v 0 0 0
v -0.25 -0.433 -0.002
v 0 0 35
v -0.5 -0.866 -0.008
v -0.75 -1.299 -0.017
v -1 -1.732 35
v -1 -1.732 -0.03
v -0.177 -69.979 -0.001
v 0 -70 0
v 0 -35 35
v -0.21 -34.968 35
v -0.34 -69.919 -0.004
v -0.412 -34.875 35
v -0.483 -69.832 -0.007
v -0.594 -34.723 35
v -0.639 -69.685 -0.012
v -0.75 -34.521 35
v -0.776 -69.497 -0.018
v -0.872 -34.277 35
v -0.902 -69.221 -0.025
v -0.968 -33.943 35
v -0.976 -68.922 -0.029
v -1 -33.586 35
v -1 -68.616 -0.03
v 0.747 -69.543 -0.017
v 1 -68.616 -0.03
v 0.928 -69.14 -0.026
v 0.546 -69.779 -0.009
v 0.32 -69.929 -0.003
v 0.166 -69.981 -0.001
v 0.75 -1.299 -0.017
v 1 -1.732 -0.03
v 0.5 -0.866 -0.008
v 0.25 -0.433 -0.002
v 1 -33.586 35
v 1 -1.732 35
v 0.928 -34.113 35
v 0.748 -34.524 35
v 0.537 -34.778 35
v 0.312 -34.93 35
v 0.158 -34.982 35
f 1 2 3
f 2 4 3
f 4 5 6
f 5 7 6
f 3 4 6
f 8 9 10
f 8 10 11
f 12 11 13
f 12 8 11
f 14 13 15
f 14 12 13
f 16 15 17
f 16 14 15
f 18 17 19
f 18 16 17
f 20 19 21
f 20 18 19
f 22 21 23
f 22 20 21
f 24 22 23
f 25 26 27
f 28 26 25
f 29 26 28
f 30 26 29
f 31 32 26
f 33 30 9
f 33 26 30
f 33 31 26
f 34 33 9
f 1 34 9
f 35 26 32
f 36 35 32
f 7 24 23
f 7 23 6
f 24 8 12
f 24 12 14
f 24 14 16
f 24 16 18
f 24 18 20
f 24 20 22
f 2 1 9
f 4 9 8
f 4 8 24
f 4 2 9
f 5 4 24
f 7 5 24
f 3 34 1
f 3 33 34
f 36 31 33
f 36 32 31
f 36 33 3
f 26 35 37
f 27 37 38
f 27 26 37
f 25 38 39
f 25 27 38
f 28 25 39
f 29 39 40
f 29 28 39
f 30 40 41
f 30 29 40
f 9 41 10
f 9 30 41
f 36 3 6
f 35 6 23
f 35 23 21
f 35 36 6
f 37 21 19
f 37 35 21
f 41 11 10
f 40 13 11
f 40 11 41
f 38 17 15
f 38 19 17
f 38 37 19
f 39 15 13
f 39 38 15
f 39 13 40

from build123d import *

# Parameters (mm, degrees)
F0_W     = 70
F0_H     = 5
F1_DEPTH = 1
F2_R     = 1
F3_R     = 0.99999
F5_DEPTH = 75
F6_SIZE2 = 1.7320508076
F6_SIZE  = 1
F7_SIZE2 = 1.732041
F7_SIZE  = 0.99999


# Not quite as in the source:
# - a fillet or chamfer is up to 0.001 mm smaller than in the source, because OpenCascade refuses the exact size


with BuildPart() as f1:
    # F0 (on Right) → F1 (new body, symmetric)
    with BuildSketch(Plane.YZ):
        Polygon((-70, 0), (0, 0), (0, 35), (-35, 35), align=None)
        with Locations((-35, -2.5)):
            Rectangle(F0_W, F0_H)
    extrude(amount=F1_DEPTH, both=True)

    # F2
    f2_edges = [f1.edges().sort_by_distance(p)[0] for p in [
        (1, -52.5, 17.5),
    ]]
    fillet(f2_edges, radius=F2_R)

    # F3 (radius 1 in the source; OpenCascade refuses exactly that, so slightly less here)
    f3_edges = [f1.edges().sort_by_distance(p)[0] for p in [
        (-1, -52.5, 17.5),
    ]]
    fillet(f3_edges, radius=F3_R)

    # F4 (on Front) → F5 (cut, symmetric)
    with BuildSketch(Plane.XZ):
        with BuildLine():
            ThreePointArc((0, 0), (-11.6672618896, -28.1672618896), (16.5, -16.5))
            ThreePointArc((16.5, -16.5), (11.6672618896, -4.8327381104), (0, 0))
        make_face()
    extrude(amount=F5_DEPTH, both=True, mode=Mode.SUBTRACT)

    # F6
    f6_edges = [f1.edges().sort_by_distance(p)[0] for p in [
        (1, 0, 17.484835),
    ]]
    f6_side = f1.faces().sort_by_distance((0, 0, 17.494946))[0]
    chamfer(f6_edges, length=F6_SIZE, length2=F6_SIZE2, reference=f6_side)

    # F7 (size 1 and 1.7320508076 in the source; OpenCascade refuses exactly that, so slightly less here)
    f7_edges = [f1.edges().sort_by_distance(p)[0] for p in [
        (-1, 0, 17.484835),
    ]]
    f7_side = f1.faces().sort_by_distance((-0.500072, 0, 17.494946))[0]
    chamfer(f7_edges, length=F7_SIZE, length2=F7_SIZE2, reference=f7_side)


solid = f1.part
